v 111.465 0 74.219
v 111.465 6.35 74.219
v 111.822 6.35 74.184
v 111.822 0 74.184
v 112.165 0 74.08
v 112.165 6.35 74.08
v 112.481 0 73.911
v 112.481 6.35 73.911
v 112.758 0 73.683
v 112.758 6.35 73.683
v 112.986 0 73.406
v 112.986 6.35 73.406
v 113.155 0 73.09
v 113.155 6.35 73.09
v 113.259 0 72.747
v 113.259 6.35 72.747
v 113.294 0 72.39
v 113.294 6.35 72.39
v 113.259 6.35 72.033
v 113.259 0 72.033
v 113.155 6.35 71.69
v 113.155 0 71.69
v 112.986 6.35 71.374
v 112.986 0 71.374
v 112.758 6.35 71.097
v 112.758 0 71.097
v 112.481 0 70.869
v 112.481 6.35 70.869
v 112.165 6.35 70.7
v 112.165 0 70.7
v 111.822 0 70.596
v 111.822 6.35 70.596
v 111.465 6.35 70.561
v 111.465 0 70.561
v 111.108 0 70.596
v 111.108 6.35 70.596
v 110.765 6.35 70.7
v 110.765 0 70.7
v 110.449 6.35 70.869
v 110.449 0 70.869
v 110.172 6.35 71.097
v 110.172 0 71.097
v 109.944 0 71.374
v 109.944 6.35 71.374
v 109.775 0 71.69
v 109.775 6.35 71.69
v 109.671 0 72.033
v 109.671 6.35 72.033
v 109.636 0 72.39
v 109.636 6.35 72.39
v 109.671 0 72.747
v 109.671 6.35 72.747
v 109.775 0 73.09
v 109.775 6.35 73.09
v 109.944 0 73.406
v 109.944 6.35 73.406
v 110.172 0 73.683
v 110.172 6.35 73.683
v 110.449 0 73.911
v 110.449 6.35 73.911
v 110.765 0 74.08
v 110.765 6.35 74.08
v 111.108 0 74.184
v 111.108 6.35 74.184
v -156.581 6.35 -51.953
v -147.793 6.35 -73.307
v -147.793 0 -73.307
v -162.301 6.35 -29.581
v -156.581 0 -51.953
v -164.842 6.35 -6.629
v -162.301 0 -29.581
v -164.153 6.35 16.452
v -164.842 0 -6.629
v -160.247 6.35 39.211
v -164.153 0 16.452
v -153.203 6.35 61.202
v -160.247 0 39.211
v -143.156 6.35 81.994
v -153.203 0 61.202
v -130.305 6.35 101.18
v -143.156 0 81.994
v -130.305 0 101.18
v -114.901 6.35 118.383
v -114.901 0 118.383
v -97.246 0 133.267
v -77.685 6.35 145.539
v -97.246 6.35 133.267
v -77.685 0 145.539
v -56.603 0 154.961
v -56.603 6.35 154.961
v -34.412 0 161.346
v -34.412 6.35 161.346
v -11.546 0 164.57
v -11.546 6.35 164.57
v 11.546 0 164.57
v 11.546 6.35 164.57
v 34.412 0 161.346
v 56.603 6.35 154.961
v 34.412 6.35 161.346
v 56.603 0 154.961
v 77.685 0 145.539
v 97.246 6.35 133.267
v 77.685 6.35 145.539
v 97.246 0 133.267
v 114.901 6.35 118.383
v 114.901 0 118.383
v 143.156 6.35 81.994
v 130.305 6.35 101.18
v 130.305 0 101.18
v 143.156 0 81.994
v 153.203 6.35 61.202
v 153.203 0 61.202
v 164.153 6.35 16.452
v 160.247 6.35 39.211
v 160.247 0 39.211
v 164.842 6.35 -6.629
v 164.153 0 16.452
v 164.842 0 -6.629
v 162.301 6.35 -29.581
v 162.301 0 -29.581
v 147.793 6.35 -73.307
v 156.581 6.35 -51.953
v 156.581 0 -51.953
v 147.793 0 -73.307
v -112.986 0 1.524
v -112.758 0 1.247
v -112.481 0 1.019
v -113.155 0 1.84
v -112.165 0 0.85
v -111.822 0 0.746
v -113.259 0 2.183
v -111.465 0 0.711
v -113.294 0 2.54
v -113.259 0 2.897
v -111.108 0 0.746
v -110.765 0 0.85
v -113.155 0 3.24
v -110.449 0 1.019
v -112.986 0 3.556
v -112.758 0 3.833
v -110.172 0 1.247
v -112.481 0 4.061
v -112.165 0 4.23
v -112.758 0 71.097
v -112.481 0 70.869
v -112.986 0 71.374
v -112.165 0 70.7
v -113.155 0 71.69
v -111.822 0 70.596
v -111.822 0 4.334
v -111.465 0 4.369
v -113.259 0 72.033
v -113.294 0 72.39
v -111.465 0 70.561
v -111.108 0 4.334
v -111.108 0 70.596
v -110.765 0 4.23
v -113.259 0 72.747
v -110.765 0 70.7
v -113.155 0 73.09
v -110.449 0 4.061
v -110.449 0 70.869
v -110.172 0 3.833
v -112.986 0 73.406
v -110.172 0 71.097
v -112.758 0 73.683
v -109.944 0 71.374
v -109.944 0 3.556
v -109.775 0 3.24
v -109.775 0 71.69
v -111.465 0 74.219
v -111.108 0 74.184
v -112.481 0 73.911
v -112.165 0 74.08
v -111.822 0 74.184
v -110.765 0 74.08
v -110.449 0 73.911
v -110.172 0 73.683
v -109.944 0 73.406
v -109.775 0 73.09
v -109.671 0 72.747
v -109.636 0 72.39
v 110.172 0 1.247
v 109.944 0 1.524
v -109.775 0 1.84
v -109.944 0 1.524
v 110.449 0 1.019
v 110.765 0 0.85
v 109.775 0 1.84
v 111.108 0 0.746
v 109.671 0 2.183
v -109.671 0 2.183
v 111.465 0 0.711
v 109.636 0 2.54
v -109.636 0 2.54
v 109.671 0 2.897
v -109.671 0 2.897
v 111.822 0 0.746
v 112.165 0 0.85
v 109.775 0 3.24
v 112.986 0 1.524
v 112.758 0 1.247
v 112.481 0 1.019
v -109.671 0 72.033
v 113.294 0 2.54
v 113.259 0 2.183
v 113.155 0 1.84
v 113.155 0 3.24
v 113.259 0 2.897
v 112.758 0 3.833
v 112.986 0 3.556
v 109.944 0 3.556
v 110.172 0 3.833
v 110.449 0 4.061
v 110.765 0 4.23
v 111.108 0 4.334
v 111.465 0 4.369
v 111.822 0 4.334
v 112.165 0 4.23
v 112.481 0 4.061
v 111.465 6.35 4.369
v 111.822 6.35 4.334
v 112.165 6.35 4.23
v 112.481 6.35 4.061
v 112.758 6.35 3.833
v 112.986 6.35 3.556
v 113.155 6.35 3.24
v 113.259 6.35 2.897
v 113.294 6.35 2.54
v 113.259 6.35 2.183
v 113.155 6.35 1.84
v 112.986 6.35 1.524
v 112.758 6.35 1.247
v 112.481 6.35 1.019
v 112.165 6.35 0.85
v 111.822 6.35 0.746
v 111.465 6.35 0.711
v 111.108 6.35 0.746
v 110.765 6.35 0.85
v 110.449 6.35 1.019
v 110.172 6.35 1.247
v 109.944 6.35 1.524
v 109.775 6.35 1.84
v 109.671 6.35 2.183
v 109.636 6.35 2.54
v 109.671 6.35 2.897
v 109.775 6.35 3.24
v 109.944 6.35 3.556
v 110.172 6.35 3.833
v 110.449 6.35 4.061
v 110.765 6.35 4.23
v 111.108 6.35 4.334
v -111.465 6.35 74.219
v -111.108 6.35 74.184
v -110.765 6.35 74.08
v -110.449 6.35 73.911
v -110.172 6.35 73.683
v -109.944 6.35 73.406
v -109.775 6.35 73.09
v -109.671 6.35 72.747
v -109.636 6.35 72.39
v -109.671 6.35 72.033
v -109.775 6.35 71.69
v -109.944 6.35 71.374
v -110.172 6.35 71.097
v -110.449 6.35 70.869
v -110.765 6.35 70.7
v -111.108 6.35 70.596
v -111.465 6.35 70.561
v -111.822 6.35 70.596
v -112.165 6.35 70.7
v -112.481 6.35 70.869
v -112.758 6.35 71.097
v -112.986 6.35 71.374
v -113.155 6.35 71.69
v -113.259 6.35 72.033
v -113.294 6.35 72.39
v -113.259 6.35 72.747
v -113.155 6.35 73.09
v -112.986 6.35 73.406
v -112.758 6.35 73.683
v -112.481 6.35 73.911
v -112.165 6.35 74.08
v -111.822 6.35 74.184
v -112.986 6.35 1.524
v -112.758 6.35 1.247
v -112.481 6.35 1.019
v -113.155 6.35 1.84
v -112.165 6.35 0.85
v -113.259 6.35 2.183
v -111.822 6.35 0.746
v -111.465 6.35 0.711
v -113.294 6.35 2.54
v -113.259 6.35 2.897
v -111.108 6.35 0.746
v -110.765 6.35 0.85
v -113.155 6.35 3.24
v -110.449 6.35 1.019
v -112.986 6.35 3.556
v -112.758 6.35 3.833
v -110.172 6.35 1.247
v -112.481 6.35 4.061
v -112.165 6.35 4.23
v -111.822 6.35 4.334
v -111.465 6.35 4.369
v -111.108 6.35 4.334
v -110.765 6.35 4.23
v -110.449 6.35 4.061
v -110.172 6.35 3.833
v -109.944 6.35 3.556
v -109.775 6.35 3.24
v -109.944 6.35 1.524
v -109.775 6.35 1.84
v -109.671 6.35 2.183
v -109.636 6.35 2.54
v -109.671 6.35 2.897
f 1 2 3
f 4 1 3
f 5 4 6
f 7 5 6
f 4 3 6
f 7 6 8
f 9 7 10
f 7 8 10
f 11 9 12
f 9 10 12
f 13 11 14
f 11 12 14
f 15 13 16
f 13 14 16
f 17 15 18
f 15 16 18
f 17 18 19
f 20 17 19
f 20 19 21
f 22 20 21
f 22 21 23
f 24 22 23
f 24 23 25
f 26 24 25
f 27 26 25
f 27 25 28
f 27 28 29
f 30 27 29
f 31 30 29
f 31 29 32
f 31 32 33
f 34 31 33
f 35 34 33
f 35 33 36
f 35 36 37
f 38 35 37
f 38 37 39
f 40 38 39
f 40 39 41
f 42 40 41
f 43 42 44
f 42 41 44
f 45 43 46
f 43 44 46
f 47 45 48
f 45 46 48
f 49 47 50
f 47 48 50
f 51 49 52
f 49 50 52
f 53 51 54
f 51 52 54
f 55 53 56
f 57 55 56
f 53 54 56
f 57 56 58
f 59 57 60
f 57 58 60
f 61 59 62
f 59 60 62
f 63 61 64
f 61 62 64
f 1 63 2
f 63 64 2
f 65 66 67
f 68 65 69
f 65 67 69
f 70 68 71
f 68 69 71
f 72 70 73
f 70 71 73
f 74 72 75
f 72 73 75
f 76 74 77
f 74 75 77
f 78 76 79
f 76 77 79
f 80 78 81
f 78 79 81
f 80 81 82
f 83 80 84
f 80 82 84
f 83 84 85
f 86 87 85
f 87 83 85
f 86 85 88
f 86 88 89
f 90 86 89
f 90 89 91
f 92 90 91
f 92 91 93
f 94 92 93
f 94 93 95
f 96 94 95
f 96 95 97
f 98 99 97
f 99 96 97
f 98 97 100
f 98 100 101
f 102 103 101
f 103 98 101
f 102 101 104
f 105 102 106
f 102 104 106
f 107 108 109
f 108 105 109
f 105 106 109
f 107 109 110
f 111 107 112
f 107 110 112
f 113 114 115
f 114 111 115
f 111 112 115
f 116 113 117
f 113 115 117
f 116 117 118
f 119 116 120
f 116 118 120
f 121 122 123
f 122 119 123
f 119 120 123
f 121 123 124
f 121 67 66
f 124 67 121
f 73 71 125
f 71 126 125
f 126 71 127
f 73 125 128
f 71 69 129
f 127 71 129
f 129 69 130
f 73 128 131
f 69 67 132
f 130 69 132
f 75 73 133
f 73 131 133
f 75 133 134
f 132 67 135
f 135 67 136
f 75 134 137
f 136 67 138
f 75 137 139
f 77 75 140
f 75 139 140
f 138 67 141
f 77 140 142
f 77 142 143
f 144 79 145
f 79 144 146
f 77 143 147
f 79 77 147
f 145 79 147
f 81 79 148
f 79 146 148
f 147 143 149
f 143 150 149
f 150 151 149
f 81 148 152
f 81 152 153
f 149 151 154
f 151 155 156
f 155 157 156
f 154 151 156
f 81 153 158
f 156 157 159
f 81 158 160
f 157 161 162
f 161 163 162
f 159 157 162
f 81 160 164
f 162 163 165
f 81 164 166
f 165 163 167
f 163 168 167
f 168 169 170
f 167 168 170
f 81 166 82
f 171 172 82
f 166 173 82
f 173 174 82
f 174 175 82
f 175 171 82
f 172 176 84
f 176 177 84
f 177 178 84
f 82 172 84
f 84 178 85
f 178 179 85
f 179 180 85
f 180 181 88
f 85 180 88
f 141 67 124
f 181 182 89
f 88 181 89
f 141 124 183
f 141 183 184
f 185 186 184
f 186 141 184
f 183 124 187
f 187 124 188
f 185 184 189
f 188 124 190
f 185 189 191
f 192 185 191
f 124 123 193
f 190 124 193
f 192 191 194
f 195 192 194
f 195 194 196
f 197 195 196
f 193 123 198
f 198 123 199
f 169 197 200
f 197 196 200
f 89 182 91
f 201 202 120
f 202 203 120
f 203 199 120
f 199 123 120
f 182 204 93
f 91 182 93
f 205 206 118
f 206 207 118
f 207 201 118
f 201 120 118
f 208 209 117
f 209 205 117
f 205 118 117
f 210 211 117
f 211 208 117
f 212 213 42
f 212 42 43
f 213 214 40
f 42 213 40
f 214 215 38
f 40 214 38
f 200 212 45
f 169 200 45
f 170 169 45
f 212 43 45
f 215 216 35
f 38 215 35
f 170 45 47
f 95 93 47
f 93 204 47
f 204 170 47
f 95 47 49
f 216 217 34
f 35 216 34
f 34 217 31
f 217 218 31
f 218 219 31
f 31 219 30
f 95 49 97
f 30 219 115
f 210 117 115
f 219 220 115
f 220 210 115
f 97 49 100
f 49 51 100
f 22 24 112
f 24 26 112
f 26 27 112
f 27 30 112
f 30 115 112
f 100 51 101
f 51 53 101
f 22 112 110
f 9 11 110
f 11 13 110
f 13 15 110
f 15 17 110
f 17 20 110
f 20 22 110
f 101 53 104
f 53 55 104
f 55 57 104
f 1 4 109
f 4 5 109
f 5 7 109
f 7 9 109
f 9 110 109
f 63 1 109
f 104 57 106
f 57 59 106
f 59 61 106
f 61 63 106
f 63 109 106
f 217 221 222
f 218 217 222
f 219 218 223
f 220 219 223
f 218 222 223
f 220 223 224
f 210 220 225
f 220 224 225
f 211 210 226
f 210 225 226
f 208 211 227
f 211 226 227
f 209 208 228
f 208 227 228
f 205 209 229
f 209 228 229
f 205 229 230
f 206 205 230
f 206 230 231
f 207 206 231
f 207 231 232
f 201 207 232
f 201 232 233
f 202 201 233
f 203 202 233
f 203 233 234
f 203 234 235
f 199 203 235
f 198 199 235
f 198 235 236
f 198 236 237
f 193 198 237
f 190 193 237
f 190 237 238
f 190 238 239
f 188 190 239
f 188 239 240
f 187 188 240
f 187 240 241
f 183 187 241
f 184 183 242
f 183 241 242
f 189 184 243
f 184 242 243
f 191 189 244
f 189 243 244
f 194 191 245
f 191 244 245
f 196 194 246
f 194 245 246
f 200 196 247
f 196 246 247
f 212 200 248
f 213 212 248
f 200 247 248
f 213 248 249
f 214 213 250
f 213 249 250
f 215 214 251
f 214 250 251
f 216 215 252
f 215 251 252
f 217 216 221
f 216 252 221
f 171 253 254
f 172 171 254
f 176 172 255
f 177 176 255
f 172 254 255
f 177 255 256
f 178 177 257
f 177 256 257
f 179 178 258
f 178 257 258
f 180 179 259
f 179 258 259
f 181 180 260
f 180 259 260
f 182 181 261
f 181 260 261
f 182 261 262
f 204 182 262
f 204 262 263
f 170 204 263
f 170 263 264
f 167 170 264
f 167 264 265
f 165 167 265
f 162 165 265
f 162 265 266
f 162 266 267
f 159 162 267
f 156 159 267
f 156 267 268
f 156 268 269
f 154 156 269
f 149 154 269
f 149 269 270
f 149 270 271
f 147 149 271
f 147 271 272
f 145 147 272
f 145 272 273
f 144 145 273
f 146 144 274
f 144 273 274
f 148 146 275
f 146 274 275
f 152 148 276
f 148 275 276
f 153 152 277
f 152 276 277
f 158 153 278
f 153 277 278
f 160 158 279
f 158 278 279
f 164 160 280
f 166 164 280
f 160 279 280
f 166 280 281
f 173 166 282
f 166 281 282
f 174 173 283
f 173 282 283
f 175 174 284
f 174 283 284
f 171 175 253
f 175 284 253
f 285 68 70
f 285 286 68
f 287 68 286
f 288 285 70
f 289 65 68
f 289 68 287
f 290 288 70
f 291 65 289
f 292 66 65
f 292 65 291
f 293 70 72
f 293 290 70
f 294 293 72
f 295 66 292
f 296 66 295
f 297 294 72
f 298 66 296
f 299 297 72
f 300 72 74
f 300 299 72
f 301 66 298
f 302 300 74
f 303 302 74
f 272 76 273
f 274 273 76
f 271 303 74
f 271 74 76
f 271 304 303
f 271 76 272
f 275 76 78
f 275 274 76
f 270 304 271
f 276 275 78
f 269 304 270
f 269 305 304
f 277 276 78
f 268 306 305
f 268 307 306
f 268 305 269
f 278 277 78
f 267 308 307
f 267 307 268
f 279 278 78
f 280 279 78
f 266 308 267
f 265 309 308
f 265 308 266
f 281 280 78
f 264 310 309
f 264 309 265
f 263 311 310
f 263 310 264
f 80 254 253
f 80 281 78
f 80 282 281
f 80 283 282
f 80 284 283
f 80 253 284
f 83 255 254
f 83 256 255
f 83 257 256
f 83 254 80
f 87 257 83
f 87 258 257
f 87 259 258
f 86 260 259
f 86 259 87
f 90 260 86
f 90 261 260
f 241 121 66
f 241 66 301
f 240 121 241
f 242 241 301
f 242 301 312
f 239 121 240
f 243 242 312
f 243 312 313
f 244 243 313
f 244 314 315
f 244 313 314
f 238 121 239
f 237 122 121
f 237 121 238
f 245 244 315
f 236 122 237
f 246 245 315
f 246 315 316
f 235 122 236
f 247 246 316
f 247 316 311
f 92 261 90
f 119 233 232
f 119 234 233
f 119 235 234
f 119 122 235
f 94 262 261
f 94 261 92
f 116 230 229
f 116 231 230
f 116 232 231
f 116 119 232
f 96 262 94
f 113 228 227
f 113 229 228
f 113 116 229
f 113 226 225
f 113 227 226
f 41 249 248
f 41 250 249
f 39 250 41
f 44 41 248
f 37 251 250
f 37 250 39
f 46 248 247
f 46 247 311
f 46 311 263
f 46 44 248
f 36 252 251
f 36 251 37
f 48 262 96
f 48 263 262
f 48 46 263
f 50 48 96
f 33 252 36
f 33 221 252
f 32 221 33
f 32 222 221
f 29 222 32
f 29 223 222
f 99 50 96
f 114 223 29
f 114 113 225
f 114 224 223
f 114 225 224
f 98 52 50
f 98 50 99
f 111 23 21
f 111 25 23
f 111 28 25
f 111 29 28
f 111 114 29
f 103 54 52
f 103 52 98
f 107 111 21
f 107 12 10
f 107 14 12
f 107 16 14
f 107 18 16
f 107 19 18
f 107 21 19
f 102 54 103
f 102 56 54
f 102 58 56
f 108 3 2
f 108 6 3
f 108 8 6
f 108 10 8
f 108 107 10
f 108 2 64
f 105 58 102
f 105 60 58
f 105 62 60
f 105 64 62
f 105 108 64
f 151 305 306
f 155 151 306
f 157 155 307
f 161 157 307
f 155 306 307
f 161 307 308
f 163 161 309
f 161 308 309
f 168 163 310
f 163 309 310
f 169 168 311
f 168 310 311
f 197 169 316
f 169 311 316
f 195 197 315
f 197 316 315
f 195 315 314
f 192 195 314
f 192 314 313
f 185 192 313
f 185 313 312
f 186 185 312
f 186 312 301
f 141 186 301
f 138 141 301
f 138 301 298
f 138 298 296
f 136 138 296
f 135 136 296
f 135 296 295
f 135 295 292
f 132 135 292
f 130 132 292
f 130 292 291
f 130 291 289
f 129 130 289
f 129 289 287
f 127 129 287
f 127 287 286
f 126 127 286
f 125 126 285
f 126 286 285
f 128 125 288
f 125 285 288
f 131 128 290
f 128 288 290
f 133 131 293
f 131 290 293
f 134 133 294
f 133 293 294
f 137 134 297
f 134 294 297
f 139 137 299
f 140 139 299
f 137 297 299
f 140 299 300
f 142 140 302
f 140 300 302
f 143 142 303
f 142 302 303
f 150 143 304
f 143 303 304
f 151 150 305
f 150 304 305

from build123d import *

# Parameters (mm, degrees)
SKETCH1_R             = 164.975
BOSS_EXTRUDE1_DEPTH   = 6.35
F_6_CLEARANCE_HOLE1_D = 3.6576
CUT_EXTRUDE1_START    = -6.35
CUT_EXTRUDE1_DEPTH    = 6.35


with BuildPart() as part:
    # Sketch1 → Boss-Extrude1 (new body)
    with BuildSketch(Plane(origin=(0, 0, 0), x_dir=(1, 0, 0), z_dir=(0, 1, 0))):
        with Locations(Location((0, 0, 0), (0, 0, 270))):
            Circle(SKETCH1_R)
    extrude(amount=BOSS_EXTRUDE1_DEPTH)

    # #6 Clearance Hole1 (through all)
    with Locations(Plane(origin=(111.465, 0, 2.54), x_dir=(0, 0, -1), z_dir=(0, -1, 0))):
        with Locations((0, 0), (-69.85, 0), (-69.85, -222.93), (0, -222.93)):
            Hole(F_6_CLEARANCE_HOLE1_D / 2)

    # Sketch9 → Cut-Extrude1 (cut)
    with BuildSketch(Plane(origin=(0, 6.35, 0), x_dir=(1, 0, 0), z_dir=(0, 1, 0)).offset(CUT_EXTRUDE1_START)):
        with BuildLine():
            Line((-147.793016902, 73.307399216), (147.793016902, 73.307399216))
            ThreePointArc((147.793016902, 73.307399216), (0, 164.975), (-147.793016902, 73.307399216))
        make_face()
    extrude(amount=CUT_EXTRUDE1_DEPTH, mode=Mode.SUBTRACT)


solid = part.part
